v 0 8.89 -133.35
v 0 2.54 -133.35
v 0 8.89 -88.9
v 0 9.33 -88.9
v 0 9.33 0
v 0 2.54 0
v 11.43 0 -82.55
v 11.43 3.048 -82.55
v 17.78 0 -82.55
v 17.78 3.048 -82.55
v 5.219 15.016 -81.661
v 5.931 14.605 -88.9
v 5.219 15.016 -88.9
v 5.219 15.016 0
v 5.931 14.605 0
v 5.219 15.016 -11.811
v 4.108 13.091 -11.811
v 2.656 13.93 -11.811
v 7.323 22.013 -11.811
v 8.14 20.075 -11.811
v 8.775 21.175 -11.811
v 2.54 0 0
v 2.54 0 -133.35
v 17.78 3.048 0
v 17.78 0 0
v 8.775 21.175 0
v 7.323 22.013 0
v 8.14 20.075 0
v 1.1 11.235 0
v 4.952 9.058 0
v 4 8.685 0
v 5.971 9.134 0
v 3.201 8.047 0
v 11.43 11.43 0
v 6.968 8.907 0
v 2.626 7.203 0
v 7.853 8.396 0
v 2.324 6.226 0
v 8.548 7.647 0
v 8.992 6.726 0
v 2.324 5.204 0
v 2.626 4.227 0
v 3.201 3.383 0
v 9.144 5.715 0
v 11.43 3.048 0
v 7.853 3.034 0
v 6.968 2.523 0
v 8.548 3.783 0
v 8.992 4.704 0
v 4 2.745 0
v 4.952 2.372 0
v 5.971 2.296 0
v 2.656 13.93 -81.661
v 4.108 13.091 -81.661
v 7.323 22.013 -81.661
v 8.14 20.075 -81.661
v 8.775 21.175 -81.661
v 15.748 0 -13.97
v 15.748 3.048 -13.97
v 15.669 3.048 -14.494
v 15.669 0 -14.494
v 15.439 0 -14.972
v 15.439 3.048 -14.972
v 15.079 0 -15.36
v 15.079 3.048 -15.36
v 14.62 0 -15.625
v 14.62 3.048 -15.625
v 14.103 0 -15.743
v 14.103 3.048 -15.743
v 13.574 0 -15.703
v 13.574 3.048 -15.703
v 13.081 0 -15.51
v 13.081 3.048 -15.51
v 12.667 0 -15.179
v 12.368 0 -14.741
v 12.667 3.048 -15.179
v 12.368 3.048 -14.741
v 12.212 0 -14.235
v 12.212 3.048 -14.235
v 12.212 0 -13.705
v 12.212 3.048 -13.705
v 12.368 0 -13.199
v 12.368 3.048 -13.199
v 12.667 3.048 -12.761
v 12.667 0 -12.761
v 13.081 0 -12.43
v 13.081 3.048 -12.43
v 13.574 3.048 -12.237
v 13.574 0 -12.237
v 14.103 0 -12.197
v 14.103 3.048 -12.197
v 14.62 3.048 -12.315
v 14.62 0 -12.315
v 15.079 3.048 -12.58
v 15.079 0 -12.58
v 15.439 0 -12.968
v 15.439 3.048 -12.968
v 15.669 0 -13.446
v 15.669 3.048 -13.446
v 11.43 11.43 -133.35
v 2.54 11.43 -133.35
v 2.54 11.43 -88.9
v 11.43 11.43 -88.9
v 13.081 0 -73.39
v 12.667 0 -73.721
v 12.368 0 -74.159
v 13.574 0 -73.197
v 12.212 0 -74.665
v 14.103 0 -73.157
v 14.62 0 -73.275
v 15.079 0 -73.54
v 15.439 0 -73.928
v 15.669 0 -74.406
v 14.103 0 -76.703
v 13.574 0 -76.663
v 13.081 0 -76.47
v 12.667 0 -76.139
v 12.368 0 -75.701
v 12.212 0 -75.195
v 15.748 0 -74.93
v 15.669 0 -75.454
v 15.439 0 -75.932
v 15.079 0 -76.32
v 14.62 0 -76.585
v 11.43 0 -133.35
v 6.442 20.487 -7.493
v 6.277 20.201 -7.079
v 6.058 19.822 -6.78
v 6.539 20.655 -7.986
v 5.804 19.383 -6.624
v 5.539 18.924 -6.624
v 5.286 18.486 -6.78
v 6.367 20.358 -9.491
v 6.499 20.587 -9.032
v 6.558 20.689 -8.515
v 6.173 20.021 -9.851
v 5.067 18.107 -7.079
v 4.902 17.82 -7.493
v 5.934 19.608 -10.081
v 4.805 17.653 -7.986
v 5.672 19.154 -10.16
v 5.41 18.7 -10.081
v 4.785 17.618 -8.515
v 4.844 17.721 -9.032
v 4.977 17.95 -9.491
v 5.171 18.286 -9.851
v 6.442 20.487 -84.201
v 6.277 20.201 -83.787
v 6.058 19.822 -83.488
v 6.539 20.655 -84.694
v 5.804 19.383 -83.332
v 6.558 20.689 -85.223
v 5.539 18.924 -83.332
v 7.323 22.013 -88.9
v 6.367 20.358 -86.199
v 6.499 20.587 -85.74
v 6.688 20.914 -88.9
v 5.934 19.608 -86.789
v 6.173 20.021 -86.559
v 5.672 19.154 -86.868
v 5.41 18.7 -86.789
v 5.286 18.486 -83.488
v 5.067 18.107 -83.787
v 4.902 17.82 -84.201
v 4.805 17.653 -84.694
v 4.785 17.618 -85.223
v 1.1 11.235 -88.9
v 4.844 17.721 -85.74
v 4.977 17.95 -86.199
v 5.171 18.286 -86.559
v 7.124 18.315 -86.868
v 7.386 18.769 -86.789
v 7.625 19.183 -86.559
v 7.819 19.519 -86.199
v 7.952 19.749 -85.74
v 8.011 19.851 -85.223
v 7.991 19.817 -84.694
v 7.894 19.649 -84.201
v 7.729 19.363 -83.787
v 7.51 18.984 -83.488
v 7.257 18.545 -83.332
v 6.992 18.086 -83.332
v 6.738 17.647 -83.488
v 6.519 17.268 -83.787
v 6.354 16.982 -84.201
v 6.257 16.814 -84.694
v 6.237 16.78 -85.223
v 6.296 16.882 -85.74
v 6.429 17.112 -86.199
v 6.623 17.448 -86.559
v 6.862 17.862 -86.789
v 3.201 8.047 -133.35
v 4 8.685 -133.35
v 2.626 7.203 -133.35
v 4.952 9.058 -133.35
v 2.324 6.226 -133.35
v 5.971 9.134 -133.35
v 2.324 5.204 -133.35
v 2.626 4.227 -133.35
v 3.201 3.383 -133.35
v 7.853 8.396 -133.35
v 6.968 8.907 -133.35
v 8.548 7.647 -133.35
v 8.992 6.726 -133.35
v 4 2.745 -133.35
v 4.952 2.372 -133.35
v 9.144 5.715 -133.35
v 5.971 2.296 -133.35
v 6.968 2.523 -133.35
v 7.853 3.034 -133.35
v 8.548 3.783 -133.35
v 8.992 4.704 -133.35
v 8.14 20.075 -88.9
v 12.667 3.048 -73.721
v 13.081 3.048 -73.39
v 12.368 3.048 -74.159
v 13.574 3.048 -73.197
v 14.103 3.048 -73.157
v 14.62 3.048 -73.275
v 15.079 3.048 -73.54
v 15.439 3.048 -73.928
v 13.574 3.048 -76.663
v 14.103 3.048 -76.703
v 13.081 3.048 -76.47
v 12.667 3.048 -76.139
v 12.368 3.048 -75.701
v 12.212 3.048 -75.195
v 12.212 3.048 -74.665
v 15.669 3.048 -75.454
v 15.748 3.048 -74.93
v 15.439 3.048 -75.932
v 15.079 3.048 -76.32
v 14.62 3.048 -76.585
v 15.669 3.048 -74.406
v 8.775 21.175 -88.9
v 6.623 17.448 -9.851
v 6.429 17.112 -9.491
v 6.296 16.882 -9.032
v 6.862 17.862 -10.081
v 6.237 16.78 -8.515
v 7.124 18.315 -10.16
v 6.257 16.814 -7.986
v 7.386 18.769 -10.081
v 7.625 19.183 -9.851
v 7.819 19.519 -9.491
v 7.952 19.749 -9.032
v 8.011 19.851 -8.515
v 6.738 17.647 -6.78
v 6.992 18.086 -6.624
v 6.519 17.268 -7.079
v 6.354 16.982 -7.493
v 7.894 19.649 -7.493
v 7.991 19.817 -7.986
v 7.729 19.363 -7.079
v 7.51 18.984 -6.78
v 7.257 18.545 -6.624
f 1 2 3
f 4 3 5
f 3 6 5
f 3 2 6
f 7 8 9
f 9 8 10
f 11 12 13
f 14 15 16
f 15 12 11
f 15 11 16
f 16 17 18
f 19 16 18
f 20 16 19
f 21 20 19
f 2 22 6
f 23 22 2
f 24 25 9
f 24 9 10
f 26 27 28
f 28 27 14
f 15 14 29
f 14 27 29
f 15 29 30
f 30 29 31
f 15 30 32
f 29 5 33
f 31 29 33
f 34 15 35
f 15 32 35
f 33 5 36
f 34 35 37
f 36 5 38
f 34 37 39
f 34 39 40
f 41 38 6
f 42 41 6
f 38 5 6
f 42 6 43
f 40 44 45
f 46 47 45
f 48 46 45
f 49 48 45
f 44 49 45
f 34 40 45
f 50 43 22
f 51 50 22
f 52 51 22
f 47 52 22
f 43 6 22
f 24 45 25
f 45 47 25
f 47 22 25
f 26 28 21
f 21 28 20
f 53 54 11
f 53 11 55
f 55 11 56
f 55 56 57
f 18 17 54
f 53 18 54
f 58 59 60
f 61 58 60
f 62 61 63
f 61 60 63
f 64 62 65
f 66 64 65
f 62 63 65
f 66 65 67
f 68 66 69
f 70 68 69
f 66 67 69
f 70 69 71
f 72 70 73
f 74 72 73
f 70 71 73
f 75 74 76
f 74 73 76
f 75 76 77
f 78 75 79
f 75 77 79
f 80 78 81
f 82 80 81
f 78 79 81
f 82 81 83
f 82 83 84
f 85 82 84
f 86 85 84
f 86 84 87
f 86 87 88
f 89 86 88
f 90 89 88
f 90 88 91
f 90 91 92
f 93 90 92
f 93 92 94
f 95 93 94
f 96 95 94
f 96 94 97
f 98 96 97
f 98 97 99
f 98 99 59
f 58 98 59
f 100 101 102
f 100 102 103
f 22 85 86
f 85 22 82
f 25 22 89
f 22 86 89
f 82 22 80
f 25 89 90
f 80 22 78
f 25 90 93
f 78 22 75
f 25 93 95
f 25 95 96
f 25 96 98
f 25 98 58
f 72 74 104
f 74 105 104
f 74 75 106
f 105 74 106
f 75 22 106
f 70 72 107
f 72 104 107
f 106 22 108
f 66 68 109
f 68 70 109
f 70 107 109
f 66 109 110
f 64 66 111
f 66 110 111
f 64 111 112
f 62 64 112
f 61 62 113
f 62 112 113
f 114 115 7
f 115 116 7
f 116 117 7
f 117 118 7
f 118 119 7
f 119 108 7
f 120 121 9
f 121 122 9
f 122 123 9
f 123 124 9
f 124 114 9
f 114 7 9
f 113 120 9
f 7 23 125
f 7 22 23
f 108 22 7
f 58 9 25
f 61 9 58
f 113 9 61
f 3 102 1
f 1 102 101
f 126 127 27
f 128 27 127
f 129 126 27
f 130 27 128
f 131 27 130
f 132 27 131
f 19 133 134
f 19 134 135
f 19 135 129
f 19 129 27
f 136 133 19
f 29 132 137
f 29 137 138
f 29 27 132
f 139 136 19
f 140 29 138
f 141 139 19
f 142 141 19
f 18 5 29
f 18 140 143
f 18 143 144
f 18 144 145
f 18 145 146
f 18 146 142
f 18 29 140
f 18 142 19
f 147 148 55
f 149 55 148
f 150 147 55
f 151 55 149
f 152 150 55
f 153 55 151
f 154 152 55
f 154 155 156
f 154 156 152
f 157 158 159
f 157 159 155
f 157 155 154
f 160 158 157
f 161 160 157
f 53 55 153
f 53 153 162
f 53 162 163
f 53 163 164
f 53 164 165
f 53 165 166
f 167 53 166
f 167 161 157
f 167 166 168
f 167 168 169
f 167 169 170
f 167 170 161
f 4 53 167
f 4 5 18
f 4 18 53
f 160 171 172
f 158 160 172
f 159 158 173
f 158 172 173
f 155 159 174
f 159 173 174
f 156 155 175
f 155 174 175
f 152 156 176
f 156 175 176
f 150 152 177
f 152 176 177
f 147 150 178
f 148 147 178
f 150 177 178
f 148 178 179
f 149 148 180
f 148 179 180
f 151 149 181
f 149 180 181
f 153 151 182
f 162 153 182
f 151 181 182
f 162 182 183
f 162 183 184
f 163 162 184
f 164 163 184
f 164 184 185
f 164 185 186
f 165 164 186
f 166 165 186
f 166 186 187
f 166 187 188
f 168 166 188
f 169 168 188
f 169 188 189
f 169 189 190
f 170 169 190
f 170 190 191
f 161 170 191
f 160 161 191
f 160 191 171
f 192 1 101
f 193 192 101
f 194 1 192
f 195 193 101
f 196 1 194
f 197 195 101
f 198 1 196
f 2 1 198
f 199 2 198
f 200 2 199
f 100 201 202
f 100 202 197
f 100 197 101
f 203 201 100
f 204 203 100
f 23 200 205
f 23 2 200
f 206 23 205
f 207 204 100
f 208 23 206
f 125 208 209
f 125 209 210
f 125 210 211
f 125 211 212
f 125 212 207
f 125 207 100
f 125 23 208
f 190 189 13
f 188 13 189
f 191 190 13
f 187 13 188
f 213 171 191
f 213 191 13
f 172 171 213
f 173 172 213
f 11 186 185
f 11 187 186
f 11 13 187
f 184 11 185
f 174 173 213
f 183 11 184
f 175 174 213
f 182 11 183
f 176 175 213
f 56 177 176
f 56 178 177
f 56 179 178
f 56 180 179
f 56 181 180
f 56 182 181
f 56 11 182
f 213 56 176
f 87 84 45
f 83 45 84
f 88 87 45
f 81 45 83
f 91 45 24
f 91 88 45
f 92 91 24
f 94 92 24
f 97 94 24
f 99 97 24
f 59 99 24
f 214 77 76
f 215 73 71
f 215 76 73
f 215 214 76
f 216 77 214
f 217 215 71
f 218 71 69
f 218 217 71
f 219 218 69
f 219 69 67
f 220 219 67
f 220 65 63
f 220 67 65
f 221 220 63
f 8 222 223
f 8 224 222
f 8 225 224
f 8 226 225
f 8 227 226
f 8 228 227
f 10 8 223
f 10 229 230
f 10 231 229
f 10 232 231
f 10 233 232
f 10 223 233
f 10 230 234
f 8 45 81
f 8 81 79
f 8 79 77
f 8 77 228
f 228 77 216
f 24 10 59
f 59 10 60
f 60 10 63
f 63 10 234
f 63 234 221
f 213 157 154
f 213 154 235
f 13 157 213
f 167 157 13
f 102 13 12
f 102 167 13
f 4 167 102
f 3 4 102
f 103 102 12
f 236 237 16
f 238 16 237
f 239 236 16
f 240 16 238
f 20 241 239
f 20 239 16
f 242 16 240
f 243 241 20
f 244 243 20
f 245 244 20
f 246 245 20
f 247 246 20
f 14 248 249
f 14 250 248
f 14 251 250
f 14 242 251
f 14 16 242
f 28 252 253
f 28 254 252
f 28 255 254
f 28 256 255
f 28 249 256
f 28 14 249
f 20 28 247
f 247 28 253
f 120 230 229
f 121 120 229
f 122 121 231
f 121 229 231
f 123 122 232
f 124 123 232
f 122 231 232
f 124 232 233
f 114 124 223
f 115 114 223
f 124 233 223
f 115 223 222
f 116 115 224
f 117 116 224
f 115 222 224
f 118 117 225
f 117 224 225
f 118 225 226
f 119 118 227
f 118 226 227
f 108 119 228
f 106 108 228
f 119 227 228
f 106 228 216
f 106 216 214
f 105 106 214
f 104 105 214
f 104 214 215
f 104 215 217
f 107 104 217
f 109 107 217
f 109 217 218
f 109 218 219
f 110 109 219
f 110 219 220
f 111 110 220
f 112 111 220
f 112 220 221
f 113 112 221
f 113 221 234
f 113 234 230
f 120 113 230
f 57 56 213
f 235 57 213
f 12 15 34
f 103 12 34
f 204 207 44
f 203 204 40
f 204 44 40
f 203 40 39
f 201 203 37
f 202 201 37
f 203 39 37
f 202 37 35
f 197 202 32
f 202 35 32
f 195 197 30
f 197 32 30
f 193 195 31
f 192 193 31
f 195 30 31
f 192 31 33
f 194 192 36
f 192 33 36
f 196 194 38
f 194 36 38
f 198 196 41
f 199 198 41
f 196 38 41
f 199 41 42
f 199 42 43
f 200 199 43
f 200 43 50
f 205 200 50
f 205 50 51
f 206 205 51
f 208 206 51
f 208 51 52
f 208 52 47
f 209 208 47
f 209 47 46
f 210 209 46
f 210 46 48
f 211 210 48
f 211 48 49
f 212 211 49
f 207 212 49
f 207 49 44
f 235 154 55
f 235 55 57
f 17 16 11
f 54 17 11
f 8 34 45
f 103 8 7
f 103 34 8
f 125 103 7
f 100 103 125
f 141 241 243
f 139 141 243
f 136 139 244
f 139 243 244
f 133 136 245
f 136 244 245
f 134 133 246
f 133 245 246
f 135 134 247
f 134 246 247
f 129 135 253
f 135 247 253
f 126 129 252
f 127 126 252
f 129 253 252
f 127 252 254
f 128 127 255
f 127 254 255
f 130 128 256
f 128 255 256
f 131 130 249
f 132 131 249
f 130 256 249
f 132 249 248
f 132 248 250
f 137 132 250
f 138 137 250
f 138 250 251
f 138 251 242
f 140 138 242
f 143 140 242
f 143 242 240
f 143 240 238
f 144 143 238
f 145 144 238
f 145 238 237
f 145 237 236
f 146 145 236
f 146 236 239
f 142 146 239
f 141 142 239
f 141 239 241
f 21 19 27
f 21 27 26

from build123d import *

# Parameters (mm, degrees)
SKETCH1_W           = 77.47
SKETCH1_H           = 133.35
BOSS_EXTRUDE1_DEPTH = 11.43
SKETCH2_R           = 3.429
CUT_EXTRUDE1_DEPTH  = 134.35
CUT_EXTRUDE2_DEPTH  = 12.43
SKETCH4_W           = 54.61
SKETCH4_H           = 6.35
CUT_EXTRUDE3_DEPTH  = 134.35
CHAMFER1_SIZE       = 2.54
CUT_EXTRUDE4_DEPTH  = 12.43
SKETCH6_W           = 53.34
SKETCH6_H           = 82.55
CUT_EXTRUDE5_DEPTH  = 12.43
SKETCH7_R           = 1.778
HOLE_CUTS_1_DEPTH   = 6.08
BOSS_EXTRUDE5_DEPTH = 88.9
SKETCH18_W          = 6.35
SKETCH18_H          = 5.08
CUT_EXTRUDE13_DEPTH = 76.2
HOLE_CUTS_2_REACH   = 10.608
SKETCH19_R          = 1.778
SKETCH20_W          = 88.9
SKETCH20_H          = 11.176
CUT_EXTRUDE16_DEPTH = 1.27
CUT_EXTRUDE22_DEPTH = 134.35
SKETCH22_W          = 6.35
SKETCH22_H          = 82.55
CUT_EXTRUDE18_DEPTH = 2.032
SKETCH23_W          = 1.676805636
SKETCH23_H          = 88.9
BOSS_EXTRUDE6_DEPTH = 1.27
CUT_EXTRUDE19_REACH = 10.019
SKETCH24_W          = 69.85
SKETCH24_H          = 9.3345
CUT_EXTRUDE20_REACH = 12.28
SKETCH25_W          = 1.27
SKETCH25_H          = 88.9
CUT_EXTRUDE21_REACH = 7.08
SKETCH26_W          = 6.35
SKETCH26_H          = 6.35


with BuildPart() as part:
    # Sketch1 → Boss-Extrude1 (new body)
    with BuildSketch(Plane(origin=(0, 0, 0), x_dir=(1, 0, 0), z_dir=(0, 1, 0))):
        with Locations((38.735, 66.675)):
            Rectangle(SKETCH1_W, SKETCH1_H)
    extrude(amount=BOSS_EXTRUDE1_DEPTH)

    # Sketch2 → Cut-Extrude1 (cut, through all)
    with BuildSketch(Plane.XY):
        with Locations((5.715, 5.715)):
            Circle(SKETCH2_R)
        with Locations((71.755, 5.715)):
            Circle(SKETCH2_R)
    extrude(amount=-CUT_EXTRUDE1_DEPTH, mode=Mode.SUBTRACT)

    # Sketch3 → Cut-Extrude2 (cut, through all)
    with BuildSketch(Plane(origin=(0, 11.43, 0), x_dir=(1, 0, 0), z_dir=(0, 1, 0))):
        with BuildLine():
            Line((11.43, 133.35), (11.43, 95.25))
            ThreePointArc((11.43, 95.25), (15.149743879, 86.269743879), (24.13, 82.55))
            Line((24.13, 82.55), (53.34, 82.55))
            ThreePointArc((53.34, 82.55), (62.320256121, 86.269743879), (66.04, 95.25))
            Line((66.04, 95.25), (66.04, 133.35))
            Line((66.04, 133.35), (11.43, 133.35))
        make_face()
    extrude(amount=-CUT_EXTRUDE2_DEPTH, mode=Mode.SUBTRACT)

    # Sketch4 → Cut-Extrude3 (cut, through all)
    with BuildSketch(Plane(origin=(0, 0, -133.35), x_dir=(-1, 0, 0), z_dir=(0, 0, -1))):
        with Locations((-38.735, 8.255)):
            Rectangle(SKETCH4_W, SKETCH4_H)
    extrude(amount=-CUT_EXTRUDE3_DEPTH, mode=Mode.SUBTRACT)

    # Chamfer1
    chamfer1_edges = [part.edges().sort_by_distance(p)[0] for p in [
        (77.47, 11.43, -66.675),
        (0, 11.43, -66.675),
        (77.47, 0, -66.675),
        (0, 0, -66.675),
    ]]
    chamfer(chamfer1_edges, length=CHAMFER1_SIZE)

    # Sketch5 → Cut-Extrude4 (cut, through all)
    with BuildSketch(Plane(origin=(0, 11.43, 0), x_dir=(1, 0, 0), z_dir=(0, 1, 0))):
        Polygon((11.43, 95.25), (11.43, 82.55), (77.47, 82.55), (77.47, 133.35), (11.43, 133.35), align=None)
    extrude(amount=-CUT_EXTRUDE4_DEPTH, mode=Mode.SUBTRACT)

    # Sketch6 → Cut-Extrude5 (cut, through all)
    with BuildSketch(Plane(origin=(0, 11.43, 0), x_dir=(1, 0, 0), z_dir=(0, 1, 0))):
        with Locations((50.8, 41.275)):
            Rectangle(SKETCH6_W, SKETCH6_H)
    extrude(amount=-CUT_EXTRUDE5_DEPTH, mode=Mode.SUBTRACT)

    # Sketch7 → Hole Cuts 1 (cut, through all)
    with BuildSketch(Plane(origin=(0, 5.08, 0), x_dir=(1, 0, 0), z_dir=(0, 1, 0))):
        with Locations((13.97, 74.93)):
            Circle(SKETCH7_R)
        with Locations((13.97, 13.97)):
            Circle(SKETCH7_R)
    extrude(amount=-HOLE_CUTS_1_DEPTH, mode=Mode.SUBTRACT)

    # Sketch17 → Boss-Extrude5 (add)
    with BuildSketch(Plane.XY):
        Polygon((0, 8.89), (0, 11.869940905), (5.588, 21.548640818), (8.851738686, 19.664320409), (5.930738686, 14.605), (11.43, 11.43), (2.54, 11.43), align=None)
    extrude(amount=-BOSS_EXTRUDE5_DEPTH)

    # Sketch18 → Cut-Extrude13 (cut)
    with BuildSketch(Plane.XY):
        with Locations((20.955, 2.54)):
            Rectangle(SKETCH18_W, SKETCH18_H)
    extrude(amount=-CUT_EXTRUDE13_DEPTH, mode=Mode.SUBTRACT)

    # Sketch19 → Hole Cuts 2 (cut, up to next)
    with BuildSketch(Plane(origin=(-1.876096497, 1.083164817, 0), x_dir=(0, 0, -1), z_dir=(0.866025404, -0.5, 0)), mode=Mode.PRIVATE) as hole_cuts_2_sk1:
        with Locations((8.382, 19.423670365)):
            Circle(SKETCH19_R)
    hole_cuts_2_tool1 = extrude(hole_cuts_2_sk1.sketch, amount=-HOLE_CUTS_2_REACH, mode=Mode.PRIVATE) & part.part
    add(hole_cuts_2_tool1.solids().sort_by_distance((7.835739, 17.904557, -8.382))[0], mode=Mode.SUBTRACT)
    # Sketch19 → Hole Cuts 2 (cut, up to next)
    with BuildSketch(Plane(origin=(-1.876096497, 1.083164817, 0), x_dir=(0, 0, -1), z_dir=(0.866025404, -0.5, 0)), mode=Mode.PRIVATE) as hole_cuts_2_sk2:
        with Locations((85.09, 19.423670365)):
            Circle(SKETCH19_R)
    hole_cuts_2_tool2 = extrude(hole_cuts_2_sk2.sketch, amount=-HOLE_CUTS_2_REACH, mode=Mode.PRIVATE) & part.part
    add(hole_cuts_2_tool2.solids().sort_by_distance((7.835739, 17.904557, -85.09))[0], mode=Mode.SUBTRACT)

    # Sketch20 → Cut-Extrude16 (cut)
    with BuildSketch(Plane(origin=(-5.139835183, 2.967485226, 0), x_dir=(0, 0, 1), z_dir=(-0.866025404, 0.5, 0))):
        with Locations((-44.45, 15.867670365)):
            Rectangle(SKETCH20_W, SKETCH20_H)
    extrude(amount=-CUT_EXTRUDE16_DEPTH, mode=Mode.SUBTRACT)

    # Sketch31 → Cut-Extrude22 (cut, through all)
    with BuildSketch(Plane.XY):
        Polygon((8.14000854, 20.075238), (12.539417591, 17.535238), (9.618417591, 12.475917591), (5.21900854, 15.015917591), align=None)
    extrude(amount=-CUT_EXTRUDE22_DEPTH, mode=Mode.SUBTRACT)

    # Sketch22 → Cut-Extrude18 (cut)
    with BuildSketch(Plane(origin=(0, 5.08, 0), x_dir=(1, 0, 0), z_dir=(0, 1, 0))):
        with Locations((14.605, 41.275)):
            Rectangle(SKETCH22_W, SKETCH22_H)
    extrude(amount=-CUT_EXTRUDE18_DEPTH, mode=Mode.SUBTRACT)

    # Sketch23 → Boss-Extrude6 (add)
    with BuildSketch(Plane(origin=(10.727835183, 18.581155592, 0), x_dir=(0.866025404, -0.5, 0), z_dir=(0.5, 0.866025404, 0))):
        with Locations((-3.826567635, 44.45)):
            Rectangle(SKETCH23_W, SKETCH23_H)
    extrude(amount=BOSS_EXTRUDE6_DEPTH)

    # Sketch24 → Cut-Extrude19 (cut, up to next)
    with BuildSketch(Plane(origin=(-2.587826643, 1.494082409, 0), x_dir=(0, 0, -1), z_dir=(0.866025404, -0.5, 0)), mode=Mode.PRIVATE) as cut_extrude19_sk1:
        with Locations((46.736, 18.058420365)):
            Rectangle(SKETCH24_W, SKETCH24_H)
    cut_extrude19_tool1 = extrude(cut_extrude19_sk1.sketch, amount=-CUT_EXTRUDE19_REACH, mode=Mode.PRIVATE) & part.part
    add(cut_extrude19_tool1.solids().sort_by_distance((6.441384, 17.133133, -46.736))[0], mode=Mode.SUBTRACT)

    # Sketch25 → Cut-Extrude20 (cut, up to next)
    with BuildSketch(Plane(origin=(5.139835183, 8.902455679, 0), x_dir=(0.866025404, -0.5, 0), z_dir=(0.5, 0.866025404, 0)), mode=Mode.PRIVATE) as cut_extrude20_sk1:
        with Locations((-5.299970453, 44.45)):
            Rectangle(SKETCH25_W, SKETCH25_H)
    cut_extrude20_tool1 = extrude(cut_extrude20_sk1.sketch, amount=-CUT_EXTRUDE20_REACH, mode=Mode.PRIVATE) & part.part
    add(cut_extrude20_tool1.solids().sort_by_distance((0.549926, 11.552441, -44.45))[0], mode=Mode.SUBTRACT)

    # Sketch26 → Cut-Extrude21 (cut, up to next)
    with BuildSketch(Plane(origin=(0, 5.08, 0), x_dir=(1, 0, 0), z_dir=(0, 1, 0)), mode=Mode.PRIVATE) as cut_extrude21_sk1:
        with Locations((20.955, 79.375)):
            Rectangle(SKETCH26_W, SKETCH26_H)
    cut_extrude21_tool1 = extrude(cut_extrude21_sk1.sketch, amount=-CUT_EXTRUDE21_REACH, mode=Mode.PRIVATE) & part.part
    add(cut_extrude21_tool1.solids().sort_by_distance((20.955, 5.08, -79.375))[0], mode=Mode.SUBTRACT)


solid = part.part
